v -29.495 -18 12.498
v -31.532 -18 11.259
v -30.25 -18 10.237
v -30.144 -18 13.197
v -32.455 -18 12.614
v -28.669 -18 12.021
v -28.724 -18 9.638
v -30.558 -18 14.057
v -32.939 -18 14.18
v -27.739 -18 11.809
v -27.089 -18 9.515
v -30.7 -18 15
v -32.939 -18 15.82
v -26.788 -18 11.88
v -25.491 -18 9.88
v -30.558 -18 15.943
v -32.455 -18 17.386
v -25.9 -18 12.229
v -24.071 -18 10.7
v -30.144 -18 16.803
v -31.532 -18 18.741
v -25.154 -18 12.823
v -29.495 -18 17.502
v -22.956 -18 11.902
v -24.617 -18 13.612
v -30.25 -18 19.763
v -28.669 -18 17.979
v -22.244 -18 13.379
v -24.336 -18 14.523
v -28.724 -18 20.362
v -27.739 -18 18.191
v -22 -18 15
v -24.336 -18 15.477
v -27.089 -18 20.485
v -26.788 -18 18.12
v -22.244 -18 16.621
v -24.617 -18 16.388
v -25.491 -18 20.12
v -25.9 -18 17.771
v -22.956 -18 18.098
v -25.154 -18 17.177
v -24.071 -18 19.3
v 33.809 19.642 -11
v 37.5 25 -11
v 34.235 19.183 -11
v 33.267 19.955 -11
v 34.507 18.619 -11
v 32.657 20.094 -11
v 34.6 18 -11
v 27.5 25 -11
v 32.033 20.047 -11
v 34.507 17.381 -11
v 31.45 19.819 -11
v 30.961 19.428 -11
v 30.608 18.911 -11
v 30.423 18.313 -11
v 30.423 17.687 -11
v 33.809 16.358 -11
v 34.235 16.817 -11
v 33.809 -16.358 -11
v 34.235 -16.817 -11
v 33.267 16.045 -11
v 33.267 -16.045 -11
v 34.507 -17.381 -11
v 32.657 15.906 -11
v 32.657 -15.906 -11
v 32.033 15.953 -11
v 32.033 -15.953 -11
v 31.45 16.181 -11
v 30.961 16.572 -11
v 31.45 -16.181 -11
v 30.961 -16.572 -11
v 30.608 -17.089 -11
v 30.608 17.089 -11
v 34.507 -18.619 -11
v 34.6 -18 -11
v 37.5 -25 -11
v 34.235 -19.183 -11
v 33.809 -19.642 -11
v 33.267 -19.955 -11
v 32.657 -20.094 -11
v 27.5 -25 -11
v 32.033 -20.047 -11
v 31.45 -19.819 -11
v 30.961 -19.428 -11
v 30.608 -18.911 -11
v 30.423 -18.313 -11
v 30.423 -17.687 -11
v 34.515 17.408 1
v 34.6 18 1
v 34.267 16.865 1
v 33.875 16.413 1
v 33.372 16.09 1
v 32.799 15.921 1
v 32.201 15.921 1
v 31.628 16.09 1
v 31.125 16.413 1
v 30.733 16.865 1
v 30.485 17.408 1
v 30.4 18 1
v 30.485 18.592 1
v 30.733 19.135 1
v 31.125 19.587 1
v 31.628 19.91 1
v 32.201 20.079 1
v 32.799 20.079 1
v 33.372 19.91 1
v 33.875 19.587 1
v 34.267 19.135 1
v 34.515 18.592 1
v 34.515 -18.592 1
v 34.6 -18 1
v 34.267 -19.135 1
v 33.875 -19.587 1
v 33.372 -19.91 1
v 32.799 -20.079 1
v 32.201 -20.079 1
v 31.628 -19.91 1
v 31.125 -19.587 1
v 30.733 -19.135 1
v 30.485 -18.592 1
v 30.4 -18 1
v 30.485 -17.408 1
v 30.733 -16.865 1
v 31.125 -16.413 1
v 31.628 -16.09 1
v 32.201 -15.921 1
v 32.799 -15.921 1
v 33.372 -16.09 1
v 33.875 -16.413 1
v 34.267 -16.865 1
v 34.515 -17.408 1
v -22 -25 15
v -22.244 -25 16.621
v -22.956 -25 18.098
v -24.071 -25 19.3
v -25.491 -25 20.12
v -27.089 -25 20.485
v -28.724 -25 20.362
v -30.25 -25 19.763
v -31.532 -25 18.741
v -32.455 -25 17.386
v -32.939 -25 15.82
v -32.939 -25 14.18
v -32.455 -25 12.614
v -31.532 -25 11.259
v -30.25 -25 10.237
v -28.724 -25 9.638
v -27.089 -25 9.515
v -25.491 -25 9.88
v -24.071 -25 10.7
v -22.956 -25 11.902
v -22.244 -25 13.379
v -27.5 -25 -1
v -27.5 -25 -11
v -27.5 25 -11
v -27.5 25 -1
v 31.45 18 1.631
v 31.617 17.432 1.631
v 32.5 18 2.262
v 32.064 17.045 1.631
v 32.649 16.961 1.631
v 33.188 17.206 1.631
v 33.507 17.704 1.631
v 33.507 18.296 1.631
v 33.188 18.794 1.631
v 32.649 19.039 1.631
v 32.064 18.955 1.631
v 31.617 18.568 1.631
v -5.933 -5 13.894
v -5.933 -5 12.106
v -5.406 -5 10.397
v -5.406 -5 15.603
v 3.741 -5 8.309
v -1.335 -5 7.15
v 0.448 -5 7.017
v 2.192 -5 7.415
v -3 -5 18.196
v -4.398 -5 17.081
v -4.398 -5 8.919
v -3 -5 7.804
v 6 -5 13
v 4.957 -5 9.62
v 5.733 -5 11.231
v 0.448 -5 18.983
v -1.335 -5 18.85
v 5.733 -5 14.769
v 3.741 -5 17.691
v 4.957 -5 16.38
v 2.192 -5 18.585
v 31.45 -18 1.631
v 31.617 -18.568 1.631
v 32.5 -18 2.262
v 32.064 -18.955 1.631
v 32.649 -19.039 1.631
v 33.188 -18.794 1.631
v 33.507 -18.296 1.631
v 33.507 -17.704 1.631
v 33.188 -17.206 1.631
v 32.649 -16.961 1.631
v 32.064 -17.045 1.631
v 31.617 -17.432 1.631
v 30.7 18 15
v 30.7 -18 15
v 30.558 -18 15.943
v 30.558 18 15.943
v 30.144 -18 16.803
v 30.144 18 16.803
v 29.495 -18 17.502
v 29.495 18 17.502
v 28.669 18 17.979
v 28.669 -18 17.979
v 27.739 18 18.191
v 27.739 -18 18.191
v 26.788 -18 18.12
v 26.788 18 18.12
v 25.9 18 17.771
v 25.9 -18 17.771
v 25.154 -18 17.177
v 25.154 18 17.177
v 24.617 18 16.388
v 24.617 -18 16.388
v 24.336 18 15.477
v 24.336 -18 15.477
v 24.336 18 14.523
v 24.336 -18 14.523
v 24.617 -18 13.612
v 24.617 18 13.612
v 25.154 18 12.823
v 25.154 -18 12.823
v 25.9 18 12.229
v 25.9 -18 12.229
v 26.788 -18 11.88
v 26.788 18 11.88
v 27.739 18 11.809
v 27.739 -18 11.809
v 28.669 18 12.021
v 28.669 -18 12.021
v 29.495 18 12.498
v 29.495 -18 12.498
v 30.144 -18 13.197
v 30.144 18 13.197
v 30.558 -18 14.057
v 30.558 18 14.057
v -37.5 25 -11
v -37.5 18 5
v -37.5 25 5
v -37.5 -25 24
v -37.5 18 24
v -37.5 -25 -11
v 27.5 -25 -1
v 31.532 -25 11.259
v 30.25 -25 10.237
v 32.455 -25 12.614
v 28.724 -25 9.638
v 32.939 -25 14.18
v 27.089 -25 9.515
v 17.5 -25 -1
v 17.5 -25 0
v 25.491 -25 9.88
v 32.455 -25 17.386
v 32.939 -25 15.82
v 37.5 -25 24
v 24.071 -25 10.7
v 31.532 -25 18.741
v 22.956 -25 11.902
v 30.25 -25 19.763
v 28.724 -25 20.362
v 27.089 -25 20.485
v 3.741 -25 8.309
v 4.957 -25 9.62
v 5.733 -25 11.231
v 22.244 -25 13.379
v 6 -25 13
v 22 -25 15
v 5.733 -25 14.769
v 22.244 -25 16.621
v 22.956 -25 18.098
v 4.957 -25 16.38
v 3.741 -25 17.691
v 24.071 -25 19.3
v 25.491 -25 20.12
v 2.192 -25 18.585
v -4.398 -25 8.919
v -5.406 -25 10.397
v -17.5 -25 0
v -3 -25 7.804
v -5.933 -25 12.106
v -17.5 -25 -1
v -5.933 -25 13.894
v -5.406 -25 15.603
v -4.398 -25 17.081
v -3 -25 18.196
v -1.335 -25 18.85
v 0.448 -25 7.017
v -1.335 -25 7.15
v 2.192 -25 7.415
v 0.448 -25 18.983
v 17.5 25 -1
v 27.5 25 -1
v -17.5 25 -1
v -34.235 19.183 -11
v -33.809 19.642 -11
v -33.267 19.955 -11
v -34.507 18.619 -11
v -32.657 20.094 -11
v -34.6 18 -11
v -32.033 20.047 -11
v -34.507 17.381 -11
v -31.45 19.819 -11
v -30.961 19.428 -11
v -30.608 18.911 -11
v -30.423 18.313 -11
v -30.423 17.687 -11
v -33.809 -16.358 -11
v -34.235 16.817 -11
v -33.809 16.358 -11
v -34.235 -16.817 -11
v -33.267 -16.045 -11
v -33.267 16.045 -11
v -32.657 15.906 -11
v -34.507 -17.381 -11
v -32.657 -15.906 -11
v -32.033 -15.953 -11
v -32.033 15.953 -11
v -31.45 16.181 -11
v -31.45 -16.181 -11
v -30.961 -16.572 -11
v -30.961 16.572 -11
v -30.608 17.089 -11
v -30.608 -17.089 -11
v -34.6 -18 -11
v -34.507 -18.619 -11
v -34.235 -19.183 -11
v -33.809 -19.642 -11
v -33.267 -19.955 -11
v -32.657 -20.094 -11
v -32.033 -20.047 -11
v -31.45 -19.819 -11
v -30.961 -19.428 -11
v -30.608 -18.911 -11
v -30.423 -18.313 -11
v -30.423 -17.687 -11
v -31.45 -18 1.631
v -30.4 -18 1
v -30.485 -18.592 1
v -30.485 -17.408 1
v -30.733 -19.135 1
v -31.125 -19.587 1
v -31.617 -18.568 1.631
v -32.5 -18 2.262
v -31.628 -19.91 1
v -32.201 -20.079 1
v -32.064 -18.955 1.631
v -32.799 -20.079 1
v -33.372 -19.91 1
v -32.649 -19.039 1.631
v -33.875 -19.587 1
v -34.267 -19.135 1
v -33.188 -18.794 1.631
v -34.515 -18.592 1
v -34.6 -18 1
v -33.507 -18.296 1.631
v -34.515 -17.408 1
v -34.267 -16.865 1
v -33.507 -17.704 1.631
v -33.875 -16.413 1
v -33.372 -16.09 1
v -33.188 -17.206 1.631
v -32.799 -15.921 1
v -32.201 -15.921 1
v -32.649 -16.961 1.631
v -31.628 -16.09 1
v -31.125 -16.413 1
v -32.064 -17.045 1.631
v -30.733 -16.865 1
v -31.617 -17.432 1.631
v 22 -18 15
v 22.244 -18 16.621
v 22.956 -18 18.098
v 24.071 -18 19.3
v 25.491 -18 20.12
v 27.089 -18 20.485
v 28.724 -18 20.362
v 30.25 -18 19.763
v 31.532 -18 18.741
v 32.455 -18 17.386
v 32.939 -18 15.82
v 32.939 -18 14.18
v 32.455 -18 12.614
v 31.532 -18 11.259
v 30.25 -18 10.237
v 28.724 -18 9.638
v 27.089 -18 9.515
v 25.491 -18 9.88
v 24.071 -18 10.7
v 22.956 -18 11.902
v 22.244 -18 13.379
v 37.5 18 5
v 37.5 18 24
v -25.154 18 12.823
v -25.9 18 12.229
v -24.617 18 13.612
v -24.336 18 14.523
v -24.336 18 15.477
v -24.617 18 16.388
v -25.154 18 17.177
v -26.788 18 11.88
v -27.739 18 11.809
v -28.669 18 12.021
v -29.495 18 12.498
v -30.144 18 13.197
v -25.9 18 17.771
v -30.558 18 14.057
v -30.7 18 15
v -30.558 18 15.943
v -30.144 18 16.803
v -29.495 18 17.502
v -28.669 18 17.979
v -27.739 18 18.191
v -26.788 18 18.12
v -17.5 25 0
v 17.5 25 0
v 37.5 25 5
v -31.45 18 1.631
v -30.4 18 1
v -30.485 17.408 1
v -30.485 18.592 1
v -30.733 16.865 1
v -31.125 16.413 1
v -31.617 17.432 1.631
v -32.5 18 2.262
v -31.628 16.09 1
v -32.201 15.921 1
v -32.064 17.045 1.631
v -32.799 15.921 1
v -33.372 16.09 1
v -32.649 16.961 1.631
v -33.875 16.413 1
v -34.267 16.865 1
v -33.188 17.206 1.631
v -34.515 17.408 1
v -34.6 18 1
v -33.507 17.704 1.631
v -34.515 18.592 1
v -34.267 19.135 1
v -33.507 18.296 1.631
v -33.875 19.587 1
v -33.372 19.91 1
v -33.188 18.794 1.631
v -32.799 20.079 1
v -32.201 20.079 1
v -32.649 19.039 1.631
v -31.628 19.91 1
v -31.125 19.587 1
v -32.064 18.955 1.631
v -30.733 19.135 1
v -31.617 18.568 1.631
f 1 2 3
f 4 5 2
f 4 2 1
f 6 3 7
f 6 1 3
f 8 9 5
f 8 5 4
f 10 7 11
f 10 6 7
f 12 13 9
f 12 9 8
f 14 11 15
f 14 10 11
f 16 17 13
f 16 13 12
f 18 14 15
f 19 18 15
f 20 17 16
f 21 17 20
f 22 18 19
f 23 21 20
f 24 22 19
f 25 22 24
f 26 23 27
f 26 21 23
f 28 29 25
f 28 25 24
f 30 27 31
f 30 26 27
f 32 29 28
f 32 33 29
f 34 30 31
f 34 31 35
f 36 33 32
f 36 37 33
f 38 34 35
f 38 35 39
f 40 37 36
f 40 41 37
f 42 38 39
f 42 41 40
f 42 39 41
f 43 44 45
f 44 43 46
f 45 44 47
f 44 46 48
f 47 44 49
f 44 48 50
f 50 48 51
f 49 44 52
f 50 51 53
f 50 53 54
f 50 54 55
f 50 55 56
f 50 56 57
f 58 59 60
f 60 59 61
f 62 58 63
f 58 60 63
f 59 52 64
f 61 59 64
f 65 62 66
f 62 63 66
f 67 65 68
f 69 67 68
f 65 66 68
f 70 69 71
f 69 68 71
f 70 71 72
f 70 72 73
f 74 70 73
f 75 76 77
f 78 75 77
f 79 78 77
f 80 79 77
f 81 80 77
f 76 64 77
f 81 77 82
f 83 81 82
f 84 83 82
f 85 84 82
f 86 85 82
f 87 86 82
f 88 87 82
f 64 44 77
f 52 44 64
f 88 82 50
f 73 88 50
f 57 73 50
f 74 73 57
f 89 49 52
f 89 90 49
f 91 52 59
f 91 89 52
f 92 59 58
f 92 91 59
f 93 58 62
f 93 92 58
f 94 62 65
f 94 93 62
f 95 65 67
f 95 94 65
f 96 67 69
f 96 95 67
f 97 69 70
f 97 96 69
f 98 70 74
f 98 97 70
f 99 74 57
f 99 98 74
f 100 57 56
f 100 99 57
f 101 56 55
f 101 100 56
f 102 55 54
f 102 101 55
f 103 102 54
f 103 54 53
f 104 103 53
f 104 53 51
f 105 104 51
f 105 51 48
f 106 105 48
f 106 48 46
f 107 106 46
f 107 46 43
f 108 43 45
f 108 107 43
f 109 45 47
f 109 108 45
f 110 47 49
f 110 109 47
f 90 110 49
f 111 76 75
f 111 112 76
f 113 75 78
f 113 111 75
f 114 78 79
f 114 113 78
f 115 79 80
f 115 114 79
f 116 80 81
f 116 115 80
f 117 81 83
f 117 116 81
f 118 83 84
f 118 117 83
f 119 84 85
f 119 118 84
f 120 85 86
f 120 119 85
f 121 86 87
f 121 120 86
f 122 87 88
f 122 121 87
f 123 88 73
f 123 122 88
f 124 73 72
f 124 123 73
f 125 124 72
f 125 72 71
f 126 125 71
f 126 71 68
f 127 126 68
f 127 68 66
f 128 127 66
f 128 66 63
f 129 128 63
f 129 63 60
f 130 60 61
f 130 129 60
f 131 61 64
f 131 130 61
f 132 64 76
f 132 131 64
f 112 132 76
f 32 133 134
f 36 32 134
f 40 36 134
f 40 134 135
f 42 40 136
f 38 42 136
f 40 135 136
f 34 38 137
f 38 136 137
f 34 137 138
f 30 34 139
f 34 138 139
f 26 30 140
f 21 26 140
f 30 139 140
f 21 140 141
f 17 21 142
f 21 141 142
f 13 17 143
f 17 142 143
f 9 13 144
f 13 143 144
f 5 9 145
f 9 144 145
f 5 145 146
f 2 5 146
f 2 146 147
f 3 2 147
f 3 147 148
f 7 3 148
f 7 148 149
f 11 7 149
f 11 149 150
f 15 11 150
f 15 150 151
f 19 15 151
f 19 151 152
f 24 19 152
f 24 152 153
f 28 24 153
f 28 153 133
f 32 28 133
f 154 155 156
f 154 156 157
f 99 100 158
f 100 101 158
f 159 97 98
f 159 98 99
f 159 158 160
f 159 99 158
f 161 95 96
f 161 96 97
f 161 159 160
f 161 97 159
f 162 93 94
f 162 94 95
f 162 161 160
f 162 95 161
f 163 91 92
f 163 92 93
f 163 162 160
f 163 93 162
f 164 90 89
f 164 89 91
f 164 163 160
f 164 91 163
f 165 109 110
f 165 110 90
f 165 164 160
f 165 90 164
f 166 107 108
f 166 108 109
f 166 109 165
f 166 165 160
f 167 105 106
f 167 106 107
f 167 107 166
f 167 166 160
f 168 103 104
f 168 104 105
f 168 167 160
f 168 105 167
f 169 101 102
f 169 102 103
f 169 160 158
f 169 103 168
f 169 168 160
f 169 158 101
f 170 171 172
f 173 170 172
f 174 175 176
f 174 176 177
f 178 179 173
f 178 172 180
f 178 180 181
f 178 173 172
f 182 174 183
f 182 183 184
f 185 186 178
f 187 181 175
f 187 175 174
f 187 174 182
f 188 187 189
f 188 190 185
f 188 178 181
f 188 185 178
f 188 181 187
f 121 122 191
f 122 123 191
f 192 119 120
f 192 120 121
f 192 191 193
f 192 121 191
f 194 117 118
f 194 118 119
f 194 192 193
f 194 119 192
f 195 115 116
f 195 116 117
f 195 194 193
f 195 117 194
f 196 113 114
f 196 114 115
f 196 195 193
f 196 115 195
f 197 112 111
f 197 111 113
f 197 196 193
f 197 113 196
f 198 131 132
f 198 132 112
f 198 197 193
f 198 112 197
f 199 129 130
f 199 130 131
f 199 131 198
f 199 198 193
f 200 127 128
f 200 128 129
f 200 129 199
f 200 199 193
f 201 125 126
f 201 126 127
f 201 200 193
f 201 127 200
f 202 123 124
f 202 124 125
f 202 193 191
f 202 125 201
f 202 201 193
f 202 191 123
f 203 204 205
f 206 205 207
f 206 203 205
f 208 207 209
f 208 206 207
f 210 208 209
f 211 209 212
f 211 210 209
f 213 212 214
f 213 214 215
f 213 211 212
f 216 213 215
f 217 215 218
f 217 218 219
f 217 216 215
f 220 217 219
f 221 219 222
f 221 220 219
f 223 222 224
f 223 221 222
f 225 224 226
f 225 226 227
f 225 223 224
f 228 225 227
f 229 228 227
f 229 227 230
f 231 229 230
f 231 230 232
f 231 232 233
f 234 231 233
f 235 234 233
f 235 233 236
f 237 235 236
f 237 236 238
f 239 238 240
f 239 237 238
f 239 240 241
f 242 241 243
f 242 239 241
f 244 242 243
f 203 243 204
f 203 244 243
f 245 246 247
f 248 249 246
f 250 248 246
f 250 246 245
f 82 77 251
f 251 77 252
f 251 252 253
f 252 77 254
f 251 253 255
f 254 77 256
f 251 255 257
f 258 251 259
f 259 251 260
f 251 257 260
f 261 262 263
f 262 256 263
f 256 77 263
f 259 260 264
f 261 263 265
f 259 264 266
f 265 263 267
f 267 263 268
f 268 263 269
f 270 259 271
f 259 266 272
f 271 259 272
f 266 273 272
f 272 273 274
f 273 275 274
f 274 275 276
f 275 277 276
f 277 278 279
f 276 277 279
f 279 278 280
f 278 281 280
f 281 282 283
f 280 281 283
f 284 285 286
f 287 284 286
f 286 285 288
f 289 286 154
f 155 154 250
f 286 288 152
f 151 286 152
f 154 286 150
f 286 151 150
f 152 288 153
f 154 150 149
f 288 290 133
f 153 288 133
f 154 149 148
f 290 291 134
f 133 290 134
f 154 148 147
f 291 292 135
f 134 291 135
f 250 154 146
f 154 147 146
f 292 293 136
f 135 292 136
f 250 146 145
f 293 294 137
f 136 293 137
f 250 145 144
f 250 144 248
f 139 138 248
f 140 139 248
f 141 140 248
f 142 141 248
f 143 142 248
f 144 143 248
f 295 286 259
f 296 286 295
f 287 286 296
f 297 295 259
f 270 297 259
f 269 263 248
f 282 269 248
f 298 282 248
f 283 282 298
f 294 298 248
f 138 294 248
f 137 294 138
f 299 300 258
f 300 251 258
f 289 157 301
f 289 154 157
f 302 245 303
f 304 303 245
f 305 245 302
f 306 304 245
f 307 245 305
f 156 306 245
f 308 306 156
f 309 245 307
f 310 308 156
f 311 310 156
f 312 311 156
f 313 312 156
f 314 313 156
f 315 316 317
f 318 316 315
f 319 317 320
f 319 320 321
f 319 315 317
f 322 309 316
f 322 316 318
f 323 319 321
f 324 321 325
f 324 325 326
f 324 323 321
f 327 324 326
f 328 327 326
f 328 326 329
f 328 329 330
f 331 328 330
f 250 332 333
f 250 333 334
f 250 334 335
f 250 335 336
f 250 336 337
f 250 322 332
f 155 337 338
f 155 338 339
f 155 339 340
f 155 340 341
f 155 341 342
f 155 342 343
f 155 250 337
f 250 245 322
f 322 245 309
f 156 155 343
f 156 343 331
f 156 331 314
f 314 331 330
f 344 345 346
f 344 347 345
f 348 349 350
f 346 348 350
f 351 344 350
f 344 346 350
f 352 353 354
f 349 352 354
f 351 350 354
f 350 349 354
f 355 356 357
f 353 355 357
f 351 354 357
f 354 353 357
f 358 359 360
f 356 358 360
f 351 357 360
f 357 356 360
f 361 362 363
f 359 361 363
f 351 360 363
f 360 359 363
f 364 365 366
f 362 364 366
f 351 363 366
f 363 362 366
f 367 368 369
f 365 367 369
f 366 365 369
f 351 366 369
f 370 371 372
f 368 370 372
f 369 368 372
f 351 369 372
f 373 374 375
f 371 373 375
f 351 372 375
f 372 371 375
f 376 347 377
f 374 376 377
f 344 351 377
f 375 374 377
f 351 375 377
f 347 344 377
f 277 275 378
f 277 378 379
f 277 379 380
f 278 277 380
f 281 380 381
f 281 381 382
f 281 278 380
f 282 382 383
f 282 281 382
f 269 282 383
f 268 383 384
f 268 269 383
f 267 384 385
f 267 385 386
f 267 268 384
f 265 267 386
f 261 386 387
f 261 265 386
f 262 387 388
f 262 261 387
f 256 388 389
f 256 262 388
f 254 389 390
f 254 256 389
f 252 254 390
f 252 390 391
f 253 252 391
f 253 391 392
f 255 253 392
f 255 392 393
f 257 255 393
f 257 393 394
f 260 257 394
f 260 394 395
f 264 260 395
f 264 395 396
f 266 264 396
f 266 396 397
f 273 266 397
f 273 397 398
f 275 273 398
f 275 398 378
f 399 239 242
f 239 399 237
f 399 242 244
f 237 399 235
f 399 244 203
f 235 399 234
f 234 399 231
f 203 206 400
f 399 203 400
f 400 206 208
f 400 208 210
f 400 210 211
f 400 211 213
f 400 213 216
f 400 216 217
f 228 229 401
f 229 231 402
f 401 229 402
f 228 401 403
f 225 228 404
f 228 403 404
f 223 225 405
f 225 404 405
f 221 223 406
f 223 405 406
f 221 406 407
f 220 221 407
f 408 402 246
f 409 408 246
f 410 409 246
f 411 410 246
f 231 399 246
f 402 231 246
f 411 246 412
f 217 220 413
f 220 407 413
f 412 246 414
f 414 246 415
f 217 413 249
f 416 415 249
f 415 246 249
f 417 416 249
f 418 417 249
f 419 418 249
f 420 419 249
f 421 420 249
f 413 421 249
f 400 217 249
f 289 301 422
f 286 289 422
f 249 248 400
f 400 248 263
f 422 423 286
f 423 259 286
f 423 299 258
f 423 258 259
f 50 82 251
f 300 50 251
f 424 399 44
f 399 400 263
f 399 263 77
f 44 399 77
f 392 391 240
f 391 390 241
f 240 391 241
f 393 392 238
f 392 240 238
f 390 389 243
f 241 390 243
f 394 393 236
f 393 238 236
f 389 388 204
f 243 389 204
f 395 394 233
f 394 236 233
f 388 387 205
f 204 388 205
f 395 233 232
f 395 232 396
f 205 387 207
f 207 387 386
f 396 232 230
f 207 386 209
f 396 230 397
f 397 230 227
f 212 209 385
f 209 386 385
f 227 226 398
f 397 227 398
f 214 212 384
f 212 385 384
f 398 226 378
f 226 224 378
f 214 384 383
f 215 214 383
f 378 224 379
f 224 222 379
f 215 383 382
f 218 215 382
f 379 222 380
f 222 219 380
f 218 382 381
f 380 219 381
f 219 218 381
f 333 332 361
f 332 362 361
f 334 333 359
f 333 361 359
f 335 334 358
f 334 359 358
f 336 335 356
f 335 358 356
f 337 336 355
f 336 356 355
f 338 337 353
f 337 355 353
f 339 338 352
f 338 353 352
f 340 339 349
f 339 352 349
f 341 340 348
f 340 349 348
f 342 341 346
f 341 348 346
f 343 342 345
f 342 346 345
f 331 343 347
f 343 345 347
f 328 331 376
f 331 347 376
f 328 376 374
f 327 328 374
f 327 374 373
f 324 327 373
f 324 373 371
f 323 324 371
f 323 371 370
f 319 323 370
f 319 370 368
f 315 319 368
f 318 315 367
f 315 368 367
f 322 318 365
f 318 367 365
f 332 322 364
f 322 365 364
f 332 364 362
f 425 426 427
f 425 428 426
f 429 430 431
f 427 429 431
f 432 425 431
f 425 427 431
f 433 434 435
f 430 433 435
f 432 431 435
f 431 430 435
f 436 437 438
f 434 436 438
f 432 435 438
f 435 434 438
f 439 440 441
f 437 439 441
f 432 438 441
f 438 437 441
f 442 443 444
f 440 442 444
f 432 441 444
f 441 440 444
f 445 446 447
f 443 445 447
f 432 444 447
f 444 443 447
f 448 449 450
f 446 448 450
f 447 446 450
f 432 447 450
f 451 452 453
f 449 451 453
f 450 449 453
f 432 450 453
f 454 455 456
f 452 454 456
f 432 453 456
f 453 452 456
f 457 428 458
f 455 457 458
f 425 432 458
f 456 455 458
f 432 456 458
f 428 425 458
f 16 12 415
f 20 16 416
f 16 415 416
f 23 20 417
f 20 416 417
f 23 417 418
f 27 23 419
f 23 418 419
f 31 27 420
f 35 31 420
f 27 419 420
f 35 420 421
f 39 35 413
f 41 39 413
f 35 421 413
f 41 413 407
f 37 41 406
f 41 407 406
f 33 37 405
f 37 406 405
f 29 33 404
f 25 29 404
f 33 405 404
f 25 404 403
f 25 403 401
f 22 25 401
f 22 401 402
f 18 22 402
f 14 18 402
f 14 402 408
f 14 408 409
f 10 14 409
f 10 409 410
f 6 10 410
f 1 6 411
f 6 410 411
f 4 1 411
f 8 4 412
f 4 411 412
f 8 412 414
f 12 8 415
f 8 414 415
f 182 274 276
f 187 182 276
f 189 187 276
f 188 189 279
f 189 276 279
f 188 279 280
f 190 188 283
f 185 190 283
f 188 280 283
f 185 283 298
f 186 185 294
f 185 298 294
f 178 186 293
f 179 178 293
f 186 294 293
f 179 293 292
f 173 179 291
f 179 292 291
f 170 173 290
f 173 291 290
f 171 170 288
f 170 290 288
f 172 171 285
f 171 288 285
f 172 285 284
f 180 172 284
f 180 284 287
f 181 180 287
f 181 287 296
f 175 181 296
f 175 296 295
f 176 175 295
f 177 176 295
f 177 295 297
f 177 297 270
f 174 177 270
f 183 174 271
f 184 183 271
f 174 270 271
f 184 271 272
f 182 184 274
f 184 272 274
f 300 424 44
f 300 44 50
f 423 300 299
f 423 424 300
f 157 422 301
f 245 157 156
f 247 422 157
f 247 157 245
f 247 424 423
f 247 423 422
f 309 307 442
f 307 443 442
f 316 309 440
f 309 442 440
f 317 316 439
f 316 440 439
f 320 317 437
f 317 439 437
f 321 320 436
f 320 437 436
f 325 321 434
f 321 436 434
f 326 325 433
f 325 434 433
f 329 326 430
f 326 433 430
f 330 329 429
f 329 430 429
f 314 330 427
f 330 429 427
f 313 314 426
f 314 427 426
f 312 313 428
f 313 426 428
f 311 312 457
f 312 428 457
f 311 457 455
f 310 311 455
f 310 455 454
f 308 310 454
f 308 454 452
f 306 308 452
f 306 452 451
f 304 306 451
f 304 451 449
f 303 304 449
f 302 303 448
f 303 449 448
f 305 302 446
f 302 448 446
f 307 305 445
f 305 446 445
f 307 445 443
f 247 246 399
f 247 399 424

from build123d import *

# Parameters (mm, degrees)
F1_DEPTH       = 25
F2_W           = 7
F2_H           = 19
F3_DEPTH       = 37.501
F5_D           = 4.2
F5_DEPTH       = 12
F5_TIP         = 1.2618073
F7_D           = 6.4
F7_CBORE_D     = 11
F7_CBORE_DEPTH = 7
F9_R           = 6
F10_DEPTH      = 20


with BuildPart() as f1:
    # F0 (on Front) → F1 (new body, symmetric)
    with BuildSketch(Plane.XZ):
        Polygon((-17.5, 0), (0, 0), (0, 24), (-37.5, 24), (-37.5, -11), (-27.5, -11), (-27.5, -1), (-17.5, -1), align=None)
    extrude(amount=F1_DEPTH, both=True)

    # F2 (on Right) → F3 (cut, through all)
    with BuildSketch(Plane.YZ):
        with Locations((21.5, 14.5)):
            Rectangle(F2_W, F2_H)
    extrude(amount=-F3_DEPTH, mode=Mode.SUBTRACT)

    # F5
    with Locations(Plane(origin=(0, 0, -11), x_dir=(1, 0, 0), z_dir=(0, 0, -1))):
        with Locations((-32.5, 18), (-32.5, -18)):
            Hole(F5_D / 2, depth=F5_DEPTH)
            with Locations((0, 0, -(F5_DEPTH + F5_TIP / 2))):  # 118° drill point
                Cone(0, F5_D / 2, F5_TIP, mode=Mode.SUBTRACT)

    # F7 (through all)
    with Locations(Plane.XZ.offset(25)):
        with Locations((-27.5, 15)):
            CounterBoreHole(F7_D / 2, F7_CBORE_D / 2, F7_CBORE_DEPTH)

    # F8: F1 across plane


with BuildPart() as f1_1:
    add(f1.part)
    add(f1.part.mirror(Plane.YZ))

    # F9 (on face) → F10 (cut)
    with BuildSketch(Plane.XZ.offset(25)):
        with Locations((0, 13)):
            Circle(F9_R)
    extrude(amount=-F10_DEPTH, mode=Mode.SUBTRACT)


solid = f1_1.part
